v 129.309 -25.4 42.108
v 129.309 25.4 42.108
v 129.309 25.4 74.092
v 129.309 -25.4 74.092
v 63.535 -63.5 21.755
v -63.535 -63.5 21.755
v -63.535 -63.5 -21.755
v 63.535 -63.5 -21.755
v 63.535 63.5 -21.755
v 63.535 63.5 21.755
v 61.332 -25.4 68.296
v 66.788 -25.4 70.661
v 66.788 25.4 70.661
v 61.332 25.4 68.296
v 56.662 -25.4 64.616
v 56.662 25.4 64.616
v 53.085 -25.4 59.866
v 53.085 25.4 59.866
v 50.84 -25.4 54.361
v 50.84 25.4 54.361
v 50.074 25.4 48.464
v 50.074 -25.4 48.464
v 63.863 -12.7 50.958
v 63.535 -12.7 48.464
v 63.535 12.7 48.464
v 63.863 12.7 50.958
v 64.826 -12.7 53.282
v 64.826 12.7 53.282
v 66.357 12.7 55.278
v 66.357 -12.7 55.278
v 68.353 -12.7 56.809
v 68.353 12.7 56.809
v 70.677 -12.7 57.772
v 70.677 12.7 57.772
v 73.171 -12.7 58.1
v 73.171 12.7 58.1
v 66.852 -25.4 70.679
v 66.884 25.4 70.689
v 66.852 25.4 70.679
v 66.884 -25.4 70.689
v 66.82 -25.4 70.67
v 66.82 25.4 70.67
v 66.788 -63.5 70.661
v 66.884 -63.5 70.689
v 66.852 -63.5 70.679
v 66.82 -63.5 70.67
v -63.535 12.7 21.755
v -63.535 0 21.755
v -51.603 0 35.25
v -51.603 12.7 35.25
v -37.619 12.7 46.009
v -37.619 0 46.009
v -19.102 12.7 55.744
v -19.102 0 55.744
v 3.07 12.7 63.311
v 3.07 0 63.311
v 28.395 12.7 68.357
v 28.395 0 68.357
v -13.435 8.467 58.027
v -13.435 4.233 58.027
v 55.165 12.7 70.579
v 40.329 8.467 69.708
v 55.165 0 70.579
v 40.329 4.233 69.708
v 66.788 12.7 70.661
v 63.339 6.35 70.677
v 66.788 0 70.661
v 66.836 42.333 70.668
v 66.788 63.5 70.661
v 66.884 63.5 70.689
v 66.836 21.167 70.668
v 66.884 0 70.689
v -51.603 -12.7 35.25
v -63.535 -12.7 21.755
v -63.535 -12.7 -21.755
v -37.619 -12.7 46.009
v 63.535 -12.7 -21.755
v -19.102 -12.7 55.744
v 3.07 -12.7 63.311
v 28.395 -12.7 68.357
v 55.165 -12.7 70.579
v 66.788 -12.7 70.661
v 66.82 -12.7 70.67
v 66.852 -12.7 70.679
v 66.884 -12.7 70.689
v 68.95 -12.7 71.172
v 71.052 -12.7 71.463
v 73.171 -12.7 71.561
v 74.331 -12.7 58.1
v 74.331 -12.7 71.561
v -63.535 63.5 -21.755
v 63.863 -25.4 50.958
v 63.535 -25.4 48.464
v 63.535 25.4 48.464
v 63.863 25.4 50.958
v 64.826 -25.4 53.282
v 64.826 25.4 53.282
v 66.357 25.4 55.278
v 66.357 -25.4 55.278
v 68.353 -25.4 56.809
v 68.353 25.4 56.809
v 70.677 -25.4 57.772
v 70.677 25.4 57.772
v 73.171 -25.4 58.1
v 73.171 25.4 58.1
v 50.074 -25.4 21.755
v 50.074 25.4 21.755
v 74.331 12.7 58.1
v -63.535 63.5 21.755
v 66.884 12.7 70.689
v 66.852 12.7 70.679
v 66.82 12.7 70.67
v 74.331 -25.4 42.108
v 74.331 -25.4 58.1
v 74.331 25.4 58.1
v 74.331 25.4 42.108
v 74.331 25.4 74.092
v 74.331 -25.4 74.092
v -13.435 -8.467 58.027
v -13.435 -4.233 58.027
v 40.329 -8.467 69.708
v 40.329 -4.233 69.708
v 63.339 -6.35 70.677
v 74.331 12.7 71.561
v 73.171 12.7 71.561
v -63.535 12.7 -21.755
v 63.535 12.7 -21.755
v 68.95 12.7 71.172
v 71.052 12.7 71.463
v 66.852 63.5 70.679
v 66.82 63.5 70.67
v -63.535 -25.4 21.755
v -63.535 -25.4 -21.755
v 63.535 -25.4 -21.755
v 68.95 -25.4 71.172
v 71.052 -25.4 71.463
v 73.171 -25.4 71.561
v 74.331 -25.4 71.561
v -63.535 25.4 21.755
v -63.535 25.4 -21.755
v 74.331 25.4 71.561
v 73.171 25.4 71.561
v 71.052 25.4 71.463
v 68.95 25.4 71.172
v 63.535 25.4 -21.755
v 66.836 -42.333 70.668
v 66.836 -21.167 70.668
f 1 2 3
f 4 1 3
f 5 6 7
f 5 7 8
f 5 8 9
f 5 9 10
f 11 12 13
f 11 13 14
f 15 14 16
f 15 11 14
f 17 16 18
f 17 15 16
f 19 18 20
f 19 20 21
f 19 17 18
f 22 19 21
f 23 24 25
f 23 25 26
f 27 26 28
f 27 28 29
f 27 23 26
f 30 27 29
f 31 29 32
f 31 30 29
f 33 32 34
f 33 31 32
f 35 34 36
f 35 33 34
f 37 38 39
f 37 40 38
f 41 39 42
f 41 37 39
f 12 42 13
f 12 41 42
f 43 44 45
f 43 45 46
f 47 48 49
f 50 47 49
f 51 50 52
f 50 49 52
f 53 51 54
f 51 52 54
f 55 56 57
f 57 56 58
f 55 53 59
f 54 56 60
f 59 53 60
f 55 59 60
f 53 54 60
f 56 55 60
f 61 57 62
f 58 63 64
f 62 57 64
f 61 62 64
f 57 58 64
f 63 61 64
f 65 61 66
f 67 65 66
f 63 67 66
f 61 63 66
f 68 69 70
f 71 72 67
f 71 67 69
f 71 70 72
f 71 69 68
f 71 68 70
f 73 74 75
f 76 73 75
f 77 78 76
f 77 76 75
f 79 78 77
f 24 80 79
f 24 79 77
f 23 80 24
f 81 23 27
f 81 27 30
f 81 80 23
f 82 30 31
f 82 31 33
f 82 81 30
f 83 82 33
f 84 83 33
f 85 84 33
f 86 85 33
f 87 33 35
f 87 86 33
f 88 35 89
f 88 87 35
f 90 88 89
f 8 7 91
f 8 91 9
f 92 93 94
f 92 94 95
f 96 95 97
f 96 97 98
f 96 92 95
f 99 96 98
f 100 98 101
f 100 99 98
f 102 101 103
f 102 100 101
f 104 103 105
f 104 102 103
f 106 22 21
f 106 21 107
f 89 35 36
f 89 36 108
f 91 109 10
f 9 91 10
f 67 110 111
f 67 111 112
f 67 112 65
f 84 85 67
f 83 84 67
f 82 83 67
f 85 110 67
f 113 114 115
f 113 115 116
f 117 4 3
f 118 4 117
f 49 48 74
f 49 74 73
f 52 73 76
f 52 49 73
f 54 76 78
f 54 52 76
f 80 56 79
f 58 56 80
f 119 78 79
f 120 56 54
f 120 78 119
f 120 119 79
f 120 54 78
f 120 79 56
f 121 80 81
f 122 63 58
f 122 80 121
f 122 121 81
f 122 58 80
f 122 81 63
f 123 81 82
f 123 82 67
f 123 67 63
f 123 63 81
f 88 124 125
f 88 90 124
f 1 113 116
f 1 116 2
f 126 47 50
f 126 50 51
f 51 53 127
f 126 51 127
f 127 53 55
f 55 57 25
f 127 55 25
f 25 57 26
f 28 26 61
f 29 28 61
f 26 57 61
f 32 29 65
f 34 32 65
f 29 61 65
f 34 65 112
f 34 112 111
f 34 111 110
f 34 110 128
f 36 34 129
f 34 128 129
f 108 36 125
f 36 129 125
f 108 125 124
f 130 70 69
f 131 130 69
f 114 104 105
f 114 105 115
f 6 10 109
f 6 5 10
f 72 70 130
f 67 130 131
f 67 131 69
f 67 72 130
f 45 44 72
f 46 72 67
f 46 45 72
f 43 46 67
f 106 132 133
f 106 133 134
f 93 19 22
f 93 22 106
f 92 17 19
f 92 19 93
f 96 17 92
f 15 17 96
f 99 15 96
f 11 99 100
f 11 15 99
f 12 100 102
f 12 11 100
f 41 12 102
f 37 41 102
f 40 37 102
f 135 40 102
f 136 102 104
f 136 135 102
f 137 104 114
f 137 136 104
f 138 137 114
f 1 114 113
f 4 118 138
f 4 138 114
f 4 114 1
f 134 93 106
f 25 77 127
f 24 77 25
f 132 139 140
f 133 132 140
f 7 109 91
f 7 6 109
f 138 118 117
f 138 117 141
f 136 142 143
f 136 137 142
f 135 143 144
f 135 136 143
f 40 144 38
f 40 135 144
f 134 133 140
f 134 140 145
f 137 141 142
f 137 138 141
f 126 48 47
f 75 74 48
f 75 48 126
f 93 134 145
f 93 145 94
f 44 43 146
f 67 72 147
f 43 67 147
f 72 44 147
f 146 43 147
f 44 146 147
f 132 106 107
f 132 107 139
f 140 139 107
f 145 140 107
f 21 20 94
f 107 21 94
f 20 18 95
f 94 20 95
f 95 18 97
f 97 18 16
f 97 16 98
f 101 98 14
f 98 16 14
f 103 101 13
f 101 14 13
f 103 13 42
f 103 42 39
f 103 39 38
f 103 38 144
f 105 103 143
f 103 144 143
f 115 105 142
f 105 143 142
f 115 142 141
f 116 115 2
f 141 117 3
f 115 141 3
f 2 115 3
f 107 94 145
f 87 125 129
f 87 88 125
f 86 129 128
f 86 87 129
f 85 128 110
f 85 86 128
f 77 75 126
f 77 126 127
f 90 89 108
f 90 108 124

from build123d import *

# Parameters (mm, degrees)
F1_DEPTH = 63.5
F2_DEPTH = 25.4
F3_DEPTH = 12.7


with BuildPart() as f1:
    # F0 (on Front) → F1 (new body, symmetric)
    with BuildSketch(Plane.XZ):
        Polygon((-63.5346770287, 21.7547100037), (-63.5346770287, -21.7547100037), (63.5346770287, -21.7547100037), (63.5346770287, 21.7547100037), (50.0744320452, 21.7547100037), align=None)
    extrude(amount=F1_DEPTH, both=True)


with BuildPart() as f1b:
    # F0 (on Front) → F1, piece 2 (new body, symmetric)
    with BuildSketch(Plane.XZ):
        with BuildLine():
            ThreePointArc((66.8844246133, 70.6885641711), (66.835957909, 70.6747977575), (66.7875213509, 70.6609256486))
            add(Edge.make_bspline(
                [(66.7875213509, 70.6609256486), (66.8542987198, 70.666627221), (66.8577943875, 70.675737456), (66.8844246133, 70.6885641711)],
                knots=[0.9737991277, 0.9737991277, 0.9737991277, 0.9737991277, 1, 1, 1, 1], degree=3))
        make_face()
    extrude(amount=F1_DEPTH, both=True)


with BuildPart() as f2:
    # F0 (on Front) → F2 (new body, symmetric)
    with BuildSketch(Plane.XZ):
        with BuildLine():
            ThreePointArc((66.8844246133, 70.6885641711), (66.835957909, 70.6747977575), (66.7875213509, 70.6609256486))
            add(Edge.make_bspline(
                [(66.7875213509, 70.6609256486), (66.8542987198, 70.666627221), (66.8577943875, 70.675737456), (66.8844246133, 70.6885641711)],
                knots=[0.9737991277, 0.9737991277, 0.9737991277, 0.9737991277, 1, 1, 1, 1], degree=3))
        make_face()
        Polygon((-63.5346770287, 21.7547100037), (-63.5346770287, -21.7547100037), (63.5346770287, -21.7547100037), (63.5346770287, 21.7547100037), (50.0744320452, 21.7547100037), align=None)
        with BuildLine():
            Line((50.0744320452, 21.7547100037), (63.5346770287, 21.7547100037))
            Line((63.5346770287, 21.7547100037), (63.5346770287, 48.4641493763))
            ThreePointArc((63.5346770287, 48.4641493763), (66.3570400807, 55.2779365345), (73.1708272389, 58.1002995865))
            Line((73.1708272389, 58.1002995865), (74.3306106452, 58.1002995865))
            Line((74.3306106452, 58.1002995865), (74.3306106452, 71.5605445699))
            Line((74.3306106452, 71.5605445699), (73.1708272389, 71.5605445699))
            ThreePointArc((73.1708272389, 71.5605445699), (69.9975321145, 71.3415108718), (66.8844246133, 70.6885641711))
            add(Edge.make_bspline(
                [(66.7875213509, 70.6609256486), (66.8542987198, 70.666627221), (66.8577943875, 70.675737456), (66.8844246133, 70.6885641711)],
                knots=[0.9737991277, 0.9737991277, 0.9737991277, 0.9737991277, 1, 1, 1, 1], degree=3))
            ThreePointArc((66.7875213509, 70.6609256486), (54.7198811063, 62.3568113874), (50.0744320452, 48.4641493763))
            Line((50.0744320452, 48.4641493763), (50.0744320452, 21.7547100037))
        make_face()
        Polygon((74.3306106452, 71.5605445699), (74.3306106452, 58.1002995865), (74.3306106452, 42.1084646629), (129.3090334657, 42.1084646629), (129.3090334657, 74.0921345101), (74.3306106452, 74.0921345101), align=None)
    extrude(amount=F2_DEPTH, both=True)


with BuildPart() as f3:
    # F0 (on Front) → F3 (new body, symmetric)
    with BuildSketch(Plane.XZ):
        with BuildLine():
            ThreePointArc((66.8844246133, 70.6885641711), (66.835957909, 70.6747977575), (66.7875213509, 70.6609256486))
            add(Edge.make_bspline(
                [(66.7875213509, 70.6609256486), (66.8542987198, 70.666627221), (66.8577943875, 70.675737456), (66.8844246133, 70.6885641711)],
                knots=[0.9737991277, 0.9737991277, 0.9737991277, 0.9737991277, 1, 1, 1, 1], degree=3))
        make_face()
        Polygon((-63.5346770287, 21.7547100037), (-63.5346770287, -21.7547100037), (63.5346770287, -21.7547100037), (63.5346770287, 21.7547100037), (50.0744320452, 21.7547100037), align=None)
        with BuildLine():
            Line((50.0744320452, 21.7547100037), (63.5346770287, 21.7547100037))
            Line((63.5346770287, 21.7547100037), (63.5346770287, 48.4641493763))
            ThreePointArc((63.5346770287, 48.4641493763), (66.3570400807, 55.2779365345), (73.1708272389, 58.1002995865))
            Line((73.1708272389, 58.1002995865), (74.3306106452, 58.1002995865))
            Line((74.3306106452, 58.1002995865), (74.3306106452, 71.5605445699))
            Line((74.3306106452, 71.5605445699), (73.1708272389, 71.5605445699))
            ThreePointArc((73.1708272389, 71.5605445699), (69.9975321145, 71.3415108718), (66.8844246133, 70.6885641711))
            add(Edge.make_bspline(
                [(66.7875213509, 70.6609256486), (66.8542987198, 70.666627221), (66.8577943875, 70.675737456), (66.8844246133, 70.6885641711)],
                knots=[0.9737991277, 0.9737991277, 0.9737991277, 0.9737991277, 1, 1, 1, 1], degree=3))
            ThreePointArc((66.7875213509, 70.6609256486), (54.7198811063, 62.3568113874), (50.0744320452, 48.4641493763))
            Line((50.0744320452, 48.4641493763), (50.0744320452, 21.7547100037))
        make_face()
        with BuildLine():
            add(Edge.make_bspline(
                [(-63.5346770287, 21.7547100037), (-25.5911517888, 74.9457031488), (64.3056290338, 70.4490171987), (66.7875213509, 70.6609256486)],
                knots=[0, 0, 0, 0, 0.9737991277, 0.9737991277, 0.9737991277, 0.9737991277], degree=3))
            Line((-63.5346770287, 21.7547100037), (50.0744320452, 21.7547100037))
            Line((50.0744320452, 21.7547100037), (50.0744320452, 48.4641493763))
            ThreePointArc((50.0744320452, 48.4641493763), (54.7198811063, 62.3568113874), (66.7875213509, 70.6609256486))
        make_face()
    extrude(amount=F3_DEPTH, both=True)


solid = Compound([f1.part, f1b.part, f2.part, f3.part])
